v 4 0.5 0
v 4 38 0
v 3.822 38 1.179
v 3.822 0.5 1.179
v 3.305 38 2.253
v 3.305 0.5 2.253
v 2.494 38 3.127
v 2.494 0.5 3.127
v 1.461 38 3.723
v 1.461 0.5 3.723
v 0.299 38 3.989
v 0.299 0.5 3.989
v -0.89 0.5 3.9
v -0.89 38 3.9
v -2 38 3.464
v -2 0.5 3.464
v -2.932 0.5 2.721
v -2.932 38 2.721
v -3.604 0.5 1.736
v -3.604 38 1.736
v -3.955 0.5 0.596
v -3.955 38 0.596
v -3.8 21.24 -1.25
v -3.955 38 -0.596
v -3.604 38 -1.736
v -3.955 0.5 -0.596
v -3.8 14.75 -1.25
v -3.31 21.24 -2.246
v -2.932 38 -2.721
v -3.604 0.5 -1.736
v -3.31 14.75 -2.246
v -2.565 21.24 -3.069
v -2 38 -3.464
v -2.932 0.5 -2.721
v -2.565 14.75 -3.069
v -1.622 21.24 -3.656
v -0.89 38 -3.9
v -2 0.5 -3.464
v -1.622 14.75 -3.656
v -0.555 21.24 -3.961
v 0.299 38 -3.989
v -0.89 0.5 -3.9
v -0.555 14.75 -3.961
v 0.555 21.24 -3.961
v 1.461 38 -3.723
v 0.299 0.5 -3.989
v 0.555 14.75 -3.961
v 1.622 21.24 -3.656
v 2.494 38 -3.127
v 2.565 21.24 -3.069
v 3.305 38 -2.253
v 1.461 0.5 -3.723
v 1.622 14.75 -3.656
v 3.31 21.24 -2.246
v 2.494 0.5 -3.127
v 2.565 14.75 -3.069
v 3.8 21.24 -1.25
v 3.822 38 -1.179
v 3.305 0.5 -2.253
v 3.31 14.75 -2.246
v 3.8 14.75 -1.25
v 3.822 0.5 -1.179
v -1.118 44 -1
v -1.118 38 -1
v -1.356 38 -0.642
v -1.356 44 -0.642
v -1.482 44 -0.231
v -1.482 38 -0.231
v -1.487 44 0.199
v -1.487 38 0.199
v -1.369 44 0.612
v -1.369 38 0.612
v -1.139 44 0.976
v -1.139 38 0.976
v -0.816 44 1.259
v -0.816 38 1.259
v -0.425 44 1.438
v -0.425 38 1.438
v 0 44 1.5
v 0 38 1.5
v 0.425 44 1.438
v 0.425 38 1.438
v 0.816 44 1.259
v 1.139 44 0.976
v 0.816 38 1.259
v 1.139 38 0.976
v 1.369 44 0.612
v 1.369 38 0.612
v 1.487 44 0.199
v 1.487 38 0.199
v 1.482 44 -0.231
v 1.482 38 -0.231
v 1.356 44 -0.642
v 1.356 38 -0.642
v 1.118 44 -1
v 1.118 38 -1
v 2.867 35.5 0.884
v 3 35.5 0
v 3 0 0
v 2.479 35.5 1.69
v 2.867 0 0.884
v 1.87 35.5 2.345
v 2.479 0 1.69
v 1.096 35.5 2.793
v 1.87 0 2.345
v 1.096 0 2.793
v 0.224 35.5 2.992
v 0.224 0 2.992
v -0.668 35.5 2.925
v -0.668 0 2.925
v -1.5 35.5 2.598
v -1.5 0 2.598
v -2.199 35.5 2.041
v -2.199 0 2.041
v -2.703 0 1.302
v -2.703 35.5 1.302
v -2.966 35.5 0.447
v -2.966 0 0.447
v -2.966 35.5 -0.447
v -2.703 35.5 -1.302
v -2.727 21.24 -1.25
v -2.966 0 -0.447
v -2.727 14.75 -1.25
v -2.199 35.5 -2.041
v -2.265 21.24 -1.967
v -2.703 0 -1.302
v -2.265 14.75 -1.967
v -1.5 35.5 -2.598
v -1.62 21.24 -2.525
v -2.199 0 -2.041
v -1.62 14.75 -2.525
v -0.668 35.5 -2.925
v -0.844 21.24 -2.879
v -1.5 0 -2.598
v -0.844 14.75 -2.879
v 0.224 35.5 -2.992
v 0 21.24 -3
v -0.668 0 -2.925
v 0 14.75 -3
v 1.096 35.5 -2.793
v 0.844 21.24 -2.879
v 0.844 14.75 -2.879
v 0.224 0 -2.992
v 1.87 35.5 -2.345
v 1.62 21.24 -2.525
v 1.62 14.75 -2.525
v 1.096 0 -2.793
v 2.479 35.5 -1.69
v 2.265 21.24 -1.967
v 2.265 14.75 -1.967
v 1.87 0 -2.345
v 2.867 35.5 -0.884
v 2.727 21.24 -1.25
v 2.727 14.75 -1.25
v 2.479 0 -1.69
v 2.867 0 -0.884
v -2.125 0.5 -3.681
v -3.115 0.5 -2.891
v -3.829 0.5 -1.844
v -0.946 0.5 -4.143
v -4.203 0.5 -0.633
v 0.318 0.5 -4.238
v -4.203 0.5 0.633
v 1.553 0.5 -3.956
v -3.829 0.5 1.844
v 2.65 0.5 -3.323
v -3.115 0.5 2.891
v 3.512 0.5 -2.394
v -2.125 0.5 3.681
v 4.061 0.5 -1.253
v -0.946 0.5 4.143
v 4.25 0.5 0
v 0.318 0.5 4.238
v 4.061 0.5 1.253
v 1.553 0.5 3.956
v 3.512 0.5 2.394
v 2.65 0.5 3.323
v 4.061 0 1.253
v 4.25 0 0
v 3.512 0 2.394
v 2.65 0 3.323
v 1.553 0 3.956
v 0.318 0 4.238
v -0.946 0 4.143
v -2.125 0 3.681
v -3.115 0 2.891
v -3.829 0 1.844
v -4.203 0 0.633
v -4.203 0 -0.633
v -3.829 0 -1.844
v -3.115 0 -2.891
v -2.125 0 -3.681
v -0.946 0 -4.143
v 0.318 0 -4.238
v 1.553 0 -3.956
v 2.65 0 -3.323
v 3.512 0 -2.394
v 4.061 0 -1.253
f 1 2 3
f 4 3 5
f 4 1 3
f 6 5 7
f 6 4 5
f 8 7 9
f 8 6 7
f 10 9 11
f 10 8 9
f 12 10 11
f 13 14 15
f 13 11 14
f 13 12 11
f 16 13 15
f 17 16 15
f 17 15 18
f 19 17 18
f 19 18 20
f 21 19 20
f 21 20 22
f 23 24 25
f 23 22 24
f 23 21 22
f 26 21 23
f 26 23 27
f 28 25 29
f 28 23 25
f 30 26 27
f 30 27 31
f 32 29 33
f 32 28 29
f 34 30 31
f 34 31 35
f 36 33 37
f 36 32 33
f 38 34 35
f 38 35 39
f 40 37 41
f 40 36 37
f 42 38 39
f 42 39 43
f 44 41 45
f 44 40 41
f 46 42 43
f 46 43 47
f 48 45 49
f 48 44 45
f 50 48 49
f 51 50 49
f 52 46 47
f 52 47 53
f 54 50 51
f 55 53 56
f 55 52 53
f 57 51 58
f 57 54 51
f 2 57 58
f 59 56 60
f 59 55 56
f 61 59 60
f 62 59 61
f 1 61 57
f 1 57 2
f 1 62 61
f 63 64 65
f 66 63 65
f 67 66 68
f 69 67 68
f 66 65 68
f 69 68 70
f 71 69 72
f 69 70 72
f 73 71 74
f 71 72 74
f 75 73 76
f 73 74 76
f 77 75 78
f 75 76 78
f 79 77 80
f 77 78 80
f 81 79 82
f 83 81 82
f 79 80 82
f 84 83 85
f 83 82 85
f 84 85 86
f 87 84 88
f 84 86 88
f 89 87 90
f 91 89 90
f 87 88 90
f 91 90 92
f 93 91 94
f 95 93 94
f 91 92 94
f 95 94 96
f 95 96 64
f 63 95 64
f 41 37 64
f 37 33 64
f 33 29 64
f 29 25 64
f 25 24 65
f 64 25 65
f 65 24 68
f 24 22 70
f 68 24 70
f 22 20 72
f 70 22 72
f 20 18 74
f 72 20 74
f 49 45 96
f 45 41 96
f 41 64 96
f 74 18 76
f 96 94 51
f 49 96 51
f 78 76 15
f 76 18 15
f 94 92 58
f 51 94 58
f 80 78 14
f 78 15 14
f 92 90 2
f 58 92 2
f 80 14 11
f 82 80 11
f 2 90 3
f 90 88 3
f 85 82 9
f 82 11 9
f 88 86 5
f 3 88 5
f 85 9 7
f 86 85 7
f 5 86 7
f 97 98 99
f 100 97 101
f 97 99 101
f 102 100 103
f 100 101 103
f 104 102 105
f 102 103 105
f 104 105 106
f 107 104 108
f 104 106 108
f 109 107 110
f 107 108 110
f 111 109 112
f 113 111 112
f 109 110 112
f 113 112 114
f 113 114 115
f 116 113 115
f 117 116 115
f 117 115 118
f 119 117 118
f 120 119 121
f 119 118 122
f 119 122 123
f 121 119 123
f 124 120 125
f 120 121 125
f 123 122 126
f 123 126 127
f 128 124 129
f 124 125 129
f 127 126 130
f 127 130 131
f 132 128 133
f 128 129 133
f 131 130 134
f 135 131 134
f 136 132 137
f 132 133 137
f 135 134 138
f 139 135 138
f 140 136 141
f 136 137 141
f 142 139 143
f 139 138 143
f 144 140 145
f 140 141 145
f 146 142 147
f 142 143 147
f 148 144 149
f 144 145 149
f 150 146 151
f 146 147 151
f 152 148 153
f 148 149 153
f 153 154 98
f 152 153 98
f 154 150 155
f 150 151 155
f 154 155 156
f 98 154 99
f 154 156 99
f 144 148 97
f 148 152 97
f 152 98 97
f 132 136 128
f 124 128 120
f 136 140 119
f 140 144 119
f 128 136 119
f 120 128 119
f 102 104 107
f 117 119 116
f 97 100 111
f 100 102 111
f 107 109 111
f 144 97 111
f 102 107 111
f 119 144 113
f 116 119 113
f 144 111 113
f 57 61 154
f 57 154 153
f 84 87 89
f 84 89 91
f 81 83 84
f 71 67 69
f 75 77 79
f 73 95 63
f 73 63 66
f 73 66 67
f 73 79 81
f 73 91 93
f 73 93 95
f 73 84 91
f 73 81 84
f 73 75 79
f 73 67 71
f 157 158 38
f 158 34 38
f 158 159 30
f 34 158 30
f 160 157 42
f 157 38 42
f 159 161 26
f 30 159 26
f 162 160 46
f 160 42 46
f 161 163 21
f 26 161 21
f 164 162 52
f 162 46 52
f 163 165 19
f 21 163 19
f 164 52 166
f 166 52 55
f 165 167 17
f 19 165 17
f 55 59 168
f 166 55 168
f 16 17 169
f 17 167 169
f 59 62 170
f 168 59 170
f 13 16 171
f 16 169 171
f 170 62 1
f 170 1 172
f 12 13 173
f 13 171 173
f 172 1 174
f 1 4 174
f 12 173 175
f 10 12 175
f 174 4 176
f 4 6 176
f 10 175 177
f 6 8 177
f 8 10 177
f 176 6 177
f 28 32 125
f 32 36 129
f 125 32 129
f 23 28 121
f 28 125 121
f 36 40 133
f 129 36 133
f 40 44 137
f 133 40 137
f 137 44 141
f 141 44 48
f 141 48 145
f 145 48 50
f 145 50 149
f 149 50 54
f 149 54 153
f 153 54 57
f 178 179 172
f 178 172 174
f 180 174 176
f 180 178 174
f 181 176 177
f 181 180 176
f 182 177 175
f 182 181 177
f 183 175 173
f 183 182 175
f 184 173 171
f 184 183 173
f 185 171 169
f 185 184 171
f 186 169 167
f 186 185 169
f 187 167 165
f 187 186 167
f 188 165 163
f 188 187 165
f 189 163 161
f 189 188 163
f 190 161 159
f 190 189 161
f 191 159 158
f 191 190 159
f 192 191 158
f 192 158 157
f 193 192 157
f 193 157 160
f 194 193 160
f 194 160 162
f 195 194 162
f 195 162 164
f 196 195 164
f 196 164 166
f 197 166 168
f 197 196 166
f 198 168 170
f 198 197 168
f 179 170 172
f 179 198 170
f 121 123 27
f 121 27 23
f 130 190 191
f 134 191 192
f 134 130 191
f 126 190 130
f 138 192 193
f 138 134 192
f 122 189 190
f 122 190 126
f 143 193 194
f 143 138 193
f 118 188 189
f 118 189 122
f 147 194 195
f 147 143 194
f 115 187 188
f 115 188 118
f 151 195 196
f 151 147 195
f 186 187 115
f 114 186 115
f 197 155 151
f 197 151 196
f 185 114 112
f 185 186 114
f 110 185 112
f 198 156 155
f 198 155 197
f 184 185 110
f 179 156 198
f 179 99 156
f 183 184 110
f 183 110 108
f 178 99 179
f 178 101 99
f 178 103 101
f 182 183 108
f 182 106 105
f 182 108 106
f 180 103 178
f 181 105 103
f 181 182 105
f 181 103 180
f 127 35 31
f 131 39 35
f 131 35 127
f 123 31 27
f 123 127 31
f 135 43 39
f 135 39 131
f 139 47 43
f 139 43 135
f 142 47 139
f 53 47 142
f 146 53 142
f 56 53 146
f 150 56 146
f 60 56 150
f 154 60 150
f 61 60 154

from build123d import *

# Parameters (mm, degrees)
F0_R     = 4
F0_R_2   = 3
F1_DEPTH = 38
F2_R     = 4.25
F2_R_2   = 4
F2_R_3   = 3
F3_DEPTH = 0.5
F4_W     = 6.49
F4_H     = 2.75
F5_DEPTH = 12.5
F6_R     = 4
F6_R_2   = 3
F7_DEPTH = 2.5
F9_DEPTH = 6


with BuildPart() as f1:
    # F0 (on Front) → F1 (new body)
    with BuildSketch(Plane.XZ):
        Circle(F0_R)
        Circle(F0_R_2, mode=Mode.SUBTRACT)
    extrude(amount=-F1_DEPTH)

    # F2 (on face) → F3 (join)
    with BuildSketch(Plane.XZ):
        Circle(F2_R)
        Circle(F2_R_2, mode=Mode.SUBTRACT)
        Circle(F2_R_2)
        Circle(F2_R_3, mode=Mode.SUBTRACT)
    extrude(amount=-F3_DEPTH)

    # F4 (on Right) → F5 (cut, symmetric)
    with BuildSketch(Plane.YZ):
        with Locations((17.995, -2.625)):
            Rectangle(F4_W, F4_H)
    extrude(amount=F5_DEPTH, both=True, mode=Mode.SUBTRACT)

    # F6 (on face) → F7 (join)
    with BuildSketch(Plane(origin=(0, 38, 0), x_dir=(-1, 0, 0), z_dir=(0, 1, 0))):
        Circle(F6_R)
        Circle(F6_R_2, mode=Mode.SUBTRACT)
        Circle(F6_R_2)
    extrude(amount=-F7_DEPTH)

    # F8 (on face) → F9 (join)
    with BuildSketch(Plane(origin=(0, 38, 0), x_dir=(-1, 0, 0), z_dir=(0, 1, 0))):
        with BuildLine():
            Line((-1.1180339887, -1), (1.1180339887, -1))
            ThreePointArc((1.1180339887, -1), (0, 1.5), (-1.1180339887, -1))
        make_face()
    extrude(amount=F9_DEPTH)


solid = f1.part
